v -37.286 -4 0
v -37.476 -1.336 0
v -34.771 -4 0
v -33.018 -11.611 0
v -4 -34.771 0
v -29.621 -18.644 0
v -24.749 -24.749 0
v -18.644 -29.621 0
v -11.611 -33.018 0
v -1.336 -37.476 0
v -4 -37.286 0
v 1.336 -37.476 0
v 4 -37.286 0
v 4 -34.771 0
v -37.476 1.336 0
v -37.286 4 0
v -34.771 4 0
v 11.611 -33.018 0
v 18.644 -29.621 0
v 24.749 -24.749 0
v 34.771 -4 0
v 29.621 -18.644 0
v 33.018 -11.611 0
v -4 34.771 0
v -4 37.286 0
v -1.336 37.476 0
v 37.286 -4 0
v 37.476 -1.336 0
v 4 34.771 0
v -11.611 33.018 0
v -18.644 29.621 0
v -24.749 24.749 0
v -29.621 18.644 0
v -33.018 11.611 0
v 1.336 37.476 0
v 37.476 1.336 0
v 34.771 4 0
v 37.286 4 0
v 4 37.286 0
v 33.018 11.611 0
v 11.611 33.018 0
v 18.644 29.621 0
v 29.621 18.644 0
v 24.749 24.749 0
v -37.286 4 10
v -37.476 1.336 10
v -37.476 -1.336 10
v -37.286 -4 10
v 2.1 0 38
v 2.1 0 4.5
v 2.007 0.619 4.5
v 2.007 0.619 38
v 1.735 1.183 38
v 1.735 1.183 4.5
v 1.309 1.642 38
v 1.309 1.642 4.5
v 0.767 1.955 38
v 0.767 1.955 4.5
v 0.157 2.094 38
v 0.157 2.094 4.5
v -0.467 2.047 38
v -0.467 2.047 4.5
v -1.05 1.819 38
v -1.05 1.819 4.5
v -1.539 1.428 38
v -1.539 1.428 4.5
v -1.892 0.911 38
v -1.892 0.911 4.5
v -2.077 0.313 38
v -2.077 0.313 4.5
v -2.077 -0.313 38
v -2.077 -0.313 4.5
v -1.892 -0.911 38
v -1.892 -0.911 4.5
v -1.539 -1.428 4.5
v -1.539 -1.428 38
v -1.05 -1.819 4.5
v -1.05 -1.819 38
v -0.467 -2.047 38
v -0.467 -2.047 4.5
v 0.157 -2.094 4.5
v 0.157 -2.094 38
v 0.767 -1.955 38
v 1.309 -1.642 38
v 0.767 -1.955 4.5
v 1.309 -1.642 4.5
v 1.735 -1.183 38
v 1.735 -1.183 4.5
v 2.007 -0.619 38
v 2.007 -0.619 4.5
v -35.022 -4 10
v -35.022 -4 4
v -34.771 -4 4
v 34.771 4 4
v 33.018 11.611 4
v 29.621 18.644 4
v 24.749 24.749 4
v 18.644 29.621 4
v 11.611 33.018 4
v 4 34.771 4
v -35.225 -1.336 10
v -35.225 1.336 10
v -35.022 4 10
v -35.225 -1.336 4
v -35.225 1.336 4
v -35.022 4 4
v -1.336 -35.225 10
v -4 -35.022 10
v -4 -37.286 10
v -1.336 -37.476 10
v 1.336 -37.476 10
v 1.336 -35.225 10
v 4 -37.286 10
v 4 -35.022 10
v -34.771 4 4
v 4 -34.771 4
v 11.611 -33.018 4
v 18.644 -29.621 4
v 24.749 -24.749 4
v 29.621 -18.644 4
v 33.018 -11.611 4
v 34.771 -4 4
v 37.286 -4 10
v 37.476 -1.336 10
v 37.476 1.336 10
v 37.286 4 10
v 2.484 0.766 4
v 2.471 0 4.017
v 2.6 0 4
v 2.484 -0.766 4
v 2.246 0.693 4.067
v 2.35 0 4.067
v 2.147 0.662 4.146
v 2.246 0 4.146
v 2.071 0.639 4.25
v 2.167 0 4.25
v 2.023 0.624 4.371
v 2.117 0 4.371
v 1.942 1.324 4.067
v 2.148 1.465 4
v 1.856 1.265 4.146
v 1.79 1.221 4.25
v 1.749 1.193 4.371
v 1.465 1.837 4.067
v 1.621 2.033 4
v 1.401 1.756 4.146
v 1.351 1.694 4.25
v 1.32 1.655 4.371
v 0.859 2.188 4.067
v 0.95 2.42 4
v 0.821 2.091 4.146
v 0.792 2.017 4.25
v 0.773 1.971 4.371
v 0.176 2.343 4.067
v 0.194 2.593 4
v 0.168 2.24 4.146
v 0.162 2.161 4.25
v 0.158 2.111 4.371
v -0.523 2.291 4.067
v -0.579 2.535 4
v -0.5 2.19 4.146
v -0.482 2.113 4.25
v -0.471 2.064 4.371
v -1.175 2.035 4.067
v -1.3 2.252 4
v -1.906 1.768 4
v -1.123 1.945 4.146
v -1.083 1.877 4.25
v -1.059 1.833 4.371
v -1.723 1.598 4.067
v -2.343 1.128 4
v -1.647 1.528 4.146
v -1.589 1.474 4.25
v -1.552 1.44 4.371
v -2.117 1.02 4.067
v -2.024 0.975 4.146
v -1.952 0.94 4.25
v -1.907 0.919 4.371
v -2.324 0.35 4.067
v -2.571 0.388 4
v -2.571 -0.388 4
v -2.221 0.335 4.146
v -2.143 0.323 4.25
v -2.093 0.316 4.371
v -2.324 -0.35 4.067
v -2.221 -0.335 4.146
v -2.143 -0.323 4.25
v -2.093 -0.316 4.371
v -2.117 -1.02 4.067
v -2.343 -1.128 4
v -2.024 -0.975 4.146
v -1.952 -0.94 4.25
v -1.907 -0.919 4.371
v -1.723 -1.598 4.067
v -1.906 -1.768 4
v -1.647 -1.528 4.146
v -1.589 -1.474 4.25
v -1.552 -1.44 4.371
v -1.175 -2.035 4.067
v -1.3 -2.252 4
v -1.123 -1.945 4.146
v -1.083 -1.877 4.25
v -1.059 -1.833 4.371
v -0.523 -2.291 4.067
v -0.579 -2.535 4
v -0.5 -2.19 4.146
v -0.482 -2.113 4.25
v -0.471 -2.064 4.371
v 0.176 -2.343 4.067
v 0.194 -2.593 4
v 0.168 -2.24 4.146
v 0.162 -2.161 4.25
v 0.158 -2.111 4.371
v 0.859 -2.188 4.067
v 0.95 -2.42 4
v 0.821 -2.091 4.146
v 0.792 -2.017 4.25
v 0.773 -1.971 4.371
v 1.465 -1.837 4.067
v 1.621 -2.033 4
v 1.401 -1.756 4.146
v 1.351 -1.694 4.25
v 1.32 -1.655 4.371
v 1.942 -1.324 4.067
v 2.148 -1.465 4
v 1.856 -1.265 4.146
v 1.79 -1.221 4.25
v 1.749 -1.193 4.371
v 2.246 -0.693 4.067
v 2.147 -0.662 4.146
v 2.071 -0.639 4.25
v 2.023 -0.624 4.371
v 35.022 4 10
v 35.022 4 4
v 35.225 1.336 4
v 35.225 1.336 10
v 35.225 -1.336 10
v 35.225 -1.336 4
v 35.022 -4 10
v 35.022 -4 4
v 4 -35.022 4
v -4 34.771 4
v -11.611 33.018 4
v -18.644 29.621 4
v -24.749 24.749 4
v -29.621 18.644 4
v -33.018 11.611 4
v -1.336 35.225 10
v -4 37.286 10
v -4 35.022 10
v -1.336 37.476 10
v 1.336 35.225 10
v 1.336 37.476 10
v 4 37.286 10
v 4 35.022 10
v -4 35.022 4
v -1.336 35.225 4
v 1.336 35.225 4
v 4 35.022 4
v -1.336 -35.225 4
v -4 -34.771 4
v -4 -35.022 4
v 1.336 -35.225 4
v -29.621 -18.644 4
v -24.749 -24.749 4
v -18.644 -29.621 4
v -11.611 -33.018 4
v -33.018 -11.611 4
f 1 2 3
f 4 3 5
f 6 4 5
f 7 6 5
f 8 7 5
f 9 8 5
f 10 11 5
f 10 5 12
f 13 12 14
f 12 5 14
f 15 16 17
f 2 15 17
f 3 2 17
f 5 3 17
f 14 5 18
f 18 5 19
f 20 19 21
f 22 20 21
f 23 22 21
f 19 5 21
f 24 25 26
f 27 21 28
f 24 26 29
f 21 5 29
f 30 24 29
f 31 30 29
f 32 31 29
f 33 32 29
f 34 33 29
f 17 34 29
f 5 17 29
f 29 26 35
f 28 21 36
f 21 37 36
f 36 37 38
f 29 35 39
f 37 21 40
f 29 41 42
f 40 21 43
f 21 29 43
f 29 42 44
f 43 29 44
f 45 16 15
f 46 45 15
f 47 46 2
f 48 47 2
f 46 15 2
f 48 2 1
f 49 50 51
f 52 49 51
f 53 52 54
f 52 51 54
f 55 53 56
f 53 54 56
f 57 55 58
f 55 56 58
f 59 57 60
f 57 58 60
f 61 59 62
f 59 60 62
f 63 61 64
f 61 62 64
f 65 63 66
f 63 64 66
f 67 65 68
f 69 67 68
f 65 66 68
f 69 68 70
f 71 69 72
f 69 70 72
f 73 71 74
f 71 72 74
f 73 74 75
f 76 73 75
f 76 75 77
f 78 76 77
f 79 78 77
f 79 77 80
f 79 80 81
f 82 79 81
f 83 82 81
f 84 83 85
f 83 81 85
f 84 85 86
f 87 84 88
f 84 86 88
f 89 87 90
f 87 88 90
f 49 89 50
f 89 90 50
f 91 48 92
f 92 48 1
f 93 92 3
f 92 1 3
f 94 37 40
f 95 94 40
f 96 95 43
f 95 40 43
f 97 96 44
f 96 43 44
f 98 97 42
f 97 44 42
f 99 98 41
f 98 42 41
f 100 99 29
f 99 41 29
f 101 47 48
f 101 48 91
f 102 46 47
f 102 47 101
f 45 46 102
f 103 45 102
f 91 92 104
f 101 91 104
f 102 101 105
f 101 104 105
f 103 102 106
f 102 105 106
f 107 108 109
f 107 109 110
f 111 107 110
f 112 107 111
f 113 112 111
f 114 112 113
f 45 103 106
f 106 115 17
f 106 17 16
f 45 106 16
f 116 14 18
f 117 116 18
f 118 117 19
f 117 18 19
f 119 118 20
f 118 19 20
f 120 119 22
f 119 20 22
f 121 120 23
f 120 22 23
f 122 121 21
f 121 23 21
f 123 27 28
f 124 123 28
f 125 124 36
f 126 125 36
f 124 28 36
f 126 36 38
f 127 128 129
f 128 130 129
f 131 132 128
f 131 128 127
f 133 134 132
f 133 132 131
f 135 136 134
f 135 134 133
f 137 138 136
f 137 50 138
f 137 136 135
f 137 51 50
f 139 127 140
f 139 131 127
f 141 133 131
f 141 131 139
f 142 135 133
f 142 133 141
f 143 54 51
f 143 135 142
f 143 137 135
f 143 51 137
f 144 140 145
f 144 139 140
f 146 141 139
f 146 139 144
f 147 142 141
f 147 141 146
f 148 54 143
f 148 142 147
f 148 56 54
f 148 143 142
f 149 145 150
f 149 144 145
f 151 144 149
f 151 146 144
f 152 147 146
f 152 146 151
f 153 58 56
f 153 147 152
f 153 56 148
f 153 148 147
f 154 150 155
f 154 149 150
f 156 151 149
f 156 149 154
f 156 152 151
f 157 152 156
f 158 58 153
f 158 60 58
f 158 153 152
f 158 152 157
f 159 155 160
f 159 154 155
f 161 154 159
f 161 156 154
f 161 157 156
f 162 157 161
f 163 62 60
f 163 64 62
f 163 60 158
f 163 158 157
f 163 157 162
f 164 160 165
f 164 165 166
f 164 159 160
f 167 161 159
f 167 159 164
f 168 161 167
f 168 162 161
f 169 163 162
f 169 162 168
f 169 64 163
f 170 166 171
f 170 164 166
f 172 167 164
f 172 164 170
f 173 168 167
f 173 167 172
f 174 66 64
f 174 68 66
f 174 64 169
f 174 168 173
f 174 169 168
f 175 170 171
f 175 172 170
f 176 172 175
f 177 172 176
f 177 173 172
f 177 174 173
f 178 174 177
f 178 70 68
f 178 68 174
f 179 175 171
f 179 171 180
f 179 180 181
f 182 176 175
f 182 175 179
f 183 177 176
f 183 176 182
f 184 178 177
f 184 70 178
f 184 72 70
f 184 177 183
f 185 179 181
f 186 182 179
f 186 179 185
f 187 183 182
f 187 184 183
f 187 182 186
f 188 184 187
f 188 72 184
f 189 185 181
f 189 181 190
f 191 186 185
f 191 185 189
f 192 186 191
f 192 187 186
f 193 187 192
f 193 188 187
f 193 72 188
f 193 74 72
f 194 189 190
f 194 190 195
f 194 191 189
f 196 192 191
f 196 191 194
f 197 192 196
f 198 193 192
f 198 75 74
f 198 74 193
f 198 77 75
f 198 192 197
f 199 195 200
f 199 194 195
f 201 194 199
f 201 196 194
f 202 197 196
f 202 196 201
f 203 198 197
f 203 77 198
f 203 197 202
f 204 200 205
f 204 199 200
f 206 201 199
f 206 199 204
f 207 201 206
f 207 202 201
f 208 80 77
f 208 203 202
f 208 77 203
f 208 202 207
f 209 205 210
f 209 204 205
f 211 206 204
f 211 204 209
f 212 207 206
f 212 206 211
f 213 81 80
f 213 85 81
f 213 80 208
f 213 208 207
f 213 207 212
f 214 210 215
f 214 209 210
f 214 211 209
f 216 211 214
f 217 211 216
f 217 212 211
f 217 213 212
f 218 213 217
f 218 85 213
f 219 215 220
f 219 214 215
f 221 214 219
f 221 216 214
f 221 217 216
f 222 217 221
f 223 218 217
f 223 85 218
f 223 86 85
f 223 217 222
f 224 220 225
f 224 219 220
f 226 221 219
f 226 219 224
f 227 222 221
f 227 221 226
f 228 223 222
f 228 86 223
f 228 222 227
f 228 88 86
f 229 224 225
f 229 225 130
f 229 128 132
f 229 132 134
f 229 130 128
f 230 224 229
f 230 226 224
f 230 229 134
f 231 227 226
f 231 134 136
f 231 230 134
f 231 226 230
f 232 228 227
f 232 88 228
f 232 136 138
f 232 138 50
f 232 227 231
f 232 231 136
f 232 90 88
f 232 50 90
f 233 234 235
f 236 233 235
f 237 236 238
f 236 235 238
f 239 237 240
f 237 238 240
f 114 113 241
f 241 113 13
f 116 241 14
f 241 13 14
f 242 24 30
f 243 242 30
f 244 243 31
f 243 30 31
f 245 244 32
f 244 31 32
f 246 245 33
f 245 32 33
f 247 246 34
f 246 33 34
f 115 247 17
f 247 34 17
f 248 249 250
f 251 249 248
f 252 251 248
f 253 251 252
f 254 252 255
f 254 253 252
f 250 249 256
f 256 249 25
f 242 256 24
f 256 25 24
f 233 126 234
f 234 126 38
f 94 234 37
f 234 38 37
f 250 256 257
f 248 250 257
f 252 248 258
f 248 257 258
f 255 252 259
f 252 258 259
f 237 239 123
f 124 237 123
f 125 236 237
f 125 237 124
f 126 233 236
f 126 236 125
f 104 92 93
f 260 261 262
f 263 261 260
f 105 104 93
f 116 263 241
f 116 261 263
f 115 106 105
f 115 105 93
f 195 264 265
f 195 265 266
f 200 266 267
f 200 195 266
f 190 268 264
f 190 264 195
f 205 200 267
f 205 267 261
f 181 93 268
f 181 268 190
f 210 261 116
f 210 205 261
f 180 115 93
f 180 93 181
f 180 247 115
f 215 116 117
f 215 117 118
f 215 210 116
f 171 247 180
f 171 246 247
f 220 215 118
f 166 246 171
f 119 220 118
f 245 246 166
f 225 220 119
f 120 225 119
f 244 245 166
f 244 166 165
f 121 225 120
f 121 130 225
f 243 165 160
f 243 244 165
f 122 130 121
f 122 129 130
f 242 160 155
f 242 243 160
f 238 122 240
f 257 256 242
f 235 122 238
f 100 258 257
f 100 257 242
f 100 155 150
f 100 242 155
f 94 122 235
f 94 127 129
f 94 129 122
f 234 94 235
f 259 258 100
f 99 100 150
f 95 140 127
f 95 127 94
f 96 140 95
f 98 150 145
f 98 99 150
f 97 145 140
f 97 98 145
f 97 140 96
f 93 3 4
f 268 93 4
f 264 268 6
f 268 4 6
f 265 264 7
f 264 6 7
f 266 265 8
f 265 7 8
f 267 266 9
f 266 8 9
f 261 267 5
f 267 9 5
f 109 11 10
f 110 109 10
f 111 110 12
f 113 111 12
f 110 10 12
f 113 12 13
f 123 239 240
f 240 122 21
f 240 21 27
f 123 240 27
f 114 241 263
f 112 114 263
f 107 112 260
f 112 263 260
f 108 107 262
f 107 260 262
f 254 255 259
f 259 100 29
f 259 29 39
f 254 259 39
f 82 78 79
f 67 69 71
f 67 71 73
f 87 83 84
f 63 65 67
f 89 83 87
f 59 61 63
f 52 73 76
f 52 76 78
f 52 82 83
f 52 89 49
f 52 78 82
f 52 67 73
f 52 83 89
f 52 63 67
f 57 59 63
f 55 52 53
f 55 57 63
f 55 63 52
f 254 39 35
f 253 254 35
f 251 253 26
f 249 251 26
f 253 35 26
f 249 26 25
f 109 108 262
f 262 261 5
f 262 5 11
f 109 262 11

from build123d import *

# Parameters (mm, degrees)
BOSS_EXTRUDE1_DEPTH   = 10
BOSS_EXTRUDE1_2_DEPTH = 10
BOSS_EXTRUDE1_3_DEPTH = 10
BOSS_EXTRUDE1_4_DEPTH = 10
BOSS_EXTRUDE2_DEPTH   = 4
SKETCH3_R             = 2.1
BOSS_EXTRUDE3_DEPTH   = 34
FILLET1_R             = 0.5


with BuildPart() as part:
    # Sketch1 → Boss-Extrude1 (new body)
    with BuildSketch(Plane.XY):
        with BuildLine():
            ThreePointArc((37.286056375, -4), (37.5, 0), (37.286056375, 4))
            Line((37.286056375, 4), (35.022314315, 4))
            ThreePointArc((35.022314315, 4), (35.25, 0), (35.022314315, -4))
            Line((35.022314315, -4), (37.286056375, -4))
        make_face()
    extrude(amount=BOSS_EXTRUDE1_DEPTH)



with BuildPart() as body_2:
    # Sketch1 → Boss-Extrude1 2 (new body)
    with BuildSketch(Plane.XY):
        with BuildLine():
            ThreePointArc((-4, 35.022314315), (0, 35.25), (4, 35.022314315))
            Line((4, 35.022314315), (4, 37.286056375))
            ThreePointArc((4, 37.286056375), (0, 37.5), (-4, 37.286056375))
            Line((-4, 37.286056375), (-4, 35.022314315))
        make_face()
    extrude(amount=BOSS_EXTRUDE1_2_DEPTH)


with BuildPart() as body_3:
    # Sketch1 → Boss-Extrude1 3 (new body)
    with BuildSketch(Plane.XY):
        with BuildLine():
            Line((4, -37.286056375), (4, -35.022314315))
            ThreePointArc((4, -35.022314315), (0, -35.25), (-4, -35.022314315))
            Line((-4, -35.022314315), (-4, -37.286056375))
            ThreePointArc((-4, -37.286056375), (0, -37.5), (4, -37.286056375))
        make_face()
    extrude(amount=BOSS_EXTRUDE1_3_DEPTH)


with BuildPart() as body_4:
    # Sketch1 → Boss-Extrude1 4 (new body)
    with BuildSketch(Plane.XY):
        with BuildLine():
            ThreePointArc((-35.022314315, -4), (-35.25, 0), (-35.022314315, 4))
            Line((-35.022314315, 4), (-37.286056375, 4))
            ThreePointArc((-37.286056375, 4), (-37.5, 0), (-37.286056375, -4))
            Line((-37.286056375, -4), (-35.022314315, -4))
        make_face()
    extrude(amount=BOSS_EXTRUDE1_4_DEPTH)


with BuildPart() as part_1:
    add(part.part)

    add(body_2.part)  # Boss-Extrude2 merges body 2

    add(body_3.part)  # Boss-Extrude2 merges body 3

    add(body_4.part)  # Boss-Extrude2 merges body 4
    # Sketch1<3> → Boss-Extrude2 (add)
    with BuildSketch(Plane.XY):
        with BuildLine():
            ThreePointArc((35.022314315, -4), (35.25, 0), (35.022314315, 4))
            Line((35.022314315, 4), (34.770677301, 4))
            ThreePointArc((34.770677301, 4), (24.748737342, 24.748737342), (4, 34.770677301))
            Line((4, 34.770677301), (4, 35.022314315))
            ThreePointArc((4, 35.022314315), (0, 35.25), (-4, 35.022314315))
            Line((-4, 35.022314315), (-4, 34.770677301))
            ThreePointArc((-4, 34.770677301), (-24.748737342, 24.748737342), (-34.770677301, 4))
            Line((-34.770677301, 4), (-35.022314315, 4))
            ThreePointArc((-35.022314315, 4), (-35.25, 0), (-35.022314315, -4))
            Line((-35.022314315, -4), (-34.770677301, -4))
            ThreePointArc((-34.770677301, -4), (-24.748737342, -24.748737342), (-4, -34.770677301))
            Line((-4, -34.770677301), (-4, -35.022314315))
            ThreePointArc((-4, -35.022314315), (0, -35.25), (4, -35.022314315))
            Line((4, -35.022314315), (4, -34.770677301))
            ThreePointArc((4, -34.770677301), (24.748737342, -24.748737342), (34.770677301, -4))
            Line((34.770677301, -4), (35.022314315, -4))
        make_face()
    extrude(amount=BOSS_EXTRUDE2_DEPTH)

    # Sketch3 → Boss-Extrude3 (add)
    with BuildSketch(Plane.XY.offset(4)):
        Circle(SKETCH3_R)
    extrude(amount=BOSS_EXTRUDE3_DEPTH)

    # Fillet1
    fillet1_edges = [part_1.edges().sort_by_distance(p)[0] for p in [
        (-2.1, 0, 4),
    ]]
    fillet(fillet1_edges, radius=FILLET1_R)


solid = part_1.part
